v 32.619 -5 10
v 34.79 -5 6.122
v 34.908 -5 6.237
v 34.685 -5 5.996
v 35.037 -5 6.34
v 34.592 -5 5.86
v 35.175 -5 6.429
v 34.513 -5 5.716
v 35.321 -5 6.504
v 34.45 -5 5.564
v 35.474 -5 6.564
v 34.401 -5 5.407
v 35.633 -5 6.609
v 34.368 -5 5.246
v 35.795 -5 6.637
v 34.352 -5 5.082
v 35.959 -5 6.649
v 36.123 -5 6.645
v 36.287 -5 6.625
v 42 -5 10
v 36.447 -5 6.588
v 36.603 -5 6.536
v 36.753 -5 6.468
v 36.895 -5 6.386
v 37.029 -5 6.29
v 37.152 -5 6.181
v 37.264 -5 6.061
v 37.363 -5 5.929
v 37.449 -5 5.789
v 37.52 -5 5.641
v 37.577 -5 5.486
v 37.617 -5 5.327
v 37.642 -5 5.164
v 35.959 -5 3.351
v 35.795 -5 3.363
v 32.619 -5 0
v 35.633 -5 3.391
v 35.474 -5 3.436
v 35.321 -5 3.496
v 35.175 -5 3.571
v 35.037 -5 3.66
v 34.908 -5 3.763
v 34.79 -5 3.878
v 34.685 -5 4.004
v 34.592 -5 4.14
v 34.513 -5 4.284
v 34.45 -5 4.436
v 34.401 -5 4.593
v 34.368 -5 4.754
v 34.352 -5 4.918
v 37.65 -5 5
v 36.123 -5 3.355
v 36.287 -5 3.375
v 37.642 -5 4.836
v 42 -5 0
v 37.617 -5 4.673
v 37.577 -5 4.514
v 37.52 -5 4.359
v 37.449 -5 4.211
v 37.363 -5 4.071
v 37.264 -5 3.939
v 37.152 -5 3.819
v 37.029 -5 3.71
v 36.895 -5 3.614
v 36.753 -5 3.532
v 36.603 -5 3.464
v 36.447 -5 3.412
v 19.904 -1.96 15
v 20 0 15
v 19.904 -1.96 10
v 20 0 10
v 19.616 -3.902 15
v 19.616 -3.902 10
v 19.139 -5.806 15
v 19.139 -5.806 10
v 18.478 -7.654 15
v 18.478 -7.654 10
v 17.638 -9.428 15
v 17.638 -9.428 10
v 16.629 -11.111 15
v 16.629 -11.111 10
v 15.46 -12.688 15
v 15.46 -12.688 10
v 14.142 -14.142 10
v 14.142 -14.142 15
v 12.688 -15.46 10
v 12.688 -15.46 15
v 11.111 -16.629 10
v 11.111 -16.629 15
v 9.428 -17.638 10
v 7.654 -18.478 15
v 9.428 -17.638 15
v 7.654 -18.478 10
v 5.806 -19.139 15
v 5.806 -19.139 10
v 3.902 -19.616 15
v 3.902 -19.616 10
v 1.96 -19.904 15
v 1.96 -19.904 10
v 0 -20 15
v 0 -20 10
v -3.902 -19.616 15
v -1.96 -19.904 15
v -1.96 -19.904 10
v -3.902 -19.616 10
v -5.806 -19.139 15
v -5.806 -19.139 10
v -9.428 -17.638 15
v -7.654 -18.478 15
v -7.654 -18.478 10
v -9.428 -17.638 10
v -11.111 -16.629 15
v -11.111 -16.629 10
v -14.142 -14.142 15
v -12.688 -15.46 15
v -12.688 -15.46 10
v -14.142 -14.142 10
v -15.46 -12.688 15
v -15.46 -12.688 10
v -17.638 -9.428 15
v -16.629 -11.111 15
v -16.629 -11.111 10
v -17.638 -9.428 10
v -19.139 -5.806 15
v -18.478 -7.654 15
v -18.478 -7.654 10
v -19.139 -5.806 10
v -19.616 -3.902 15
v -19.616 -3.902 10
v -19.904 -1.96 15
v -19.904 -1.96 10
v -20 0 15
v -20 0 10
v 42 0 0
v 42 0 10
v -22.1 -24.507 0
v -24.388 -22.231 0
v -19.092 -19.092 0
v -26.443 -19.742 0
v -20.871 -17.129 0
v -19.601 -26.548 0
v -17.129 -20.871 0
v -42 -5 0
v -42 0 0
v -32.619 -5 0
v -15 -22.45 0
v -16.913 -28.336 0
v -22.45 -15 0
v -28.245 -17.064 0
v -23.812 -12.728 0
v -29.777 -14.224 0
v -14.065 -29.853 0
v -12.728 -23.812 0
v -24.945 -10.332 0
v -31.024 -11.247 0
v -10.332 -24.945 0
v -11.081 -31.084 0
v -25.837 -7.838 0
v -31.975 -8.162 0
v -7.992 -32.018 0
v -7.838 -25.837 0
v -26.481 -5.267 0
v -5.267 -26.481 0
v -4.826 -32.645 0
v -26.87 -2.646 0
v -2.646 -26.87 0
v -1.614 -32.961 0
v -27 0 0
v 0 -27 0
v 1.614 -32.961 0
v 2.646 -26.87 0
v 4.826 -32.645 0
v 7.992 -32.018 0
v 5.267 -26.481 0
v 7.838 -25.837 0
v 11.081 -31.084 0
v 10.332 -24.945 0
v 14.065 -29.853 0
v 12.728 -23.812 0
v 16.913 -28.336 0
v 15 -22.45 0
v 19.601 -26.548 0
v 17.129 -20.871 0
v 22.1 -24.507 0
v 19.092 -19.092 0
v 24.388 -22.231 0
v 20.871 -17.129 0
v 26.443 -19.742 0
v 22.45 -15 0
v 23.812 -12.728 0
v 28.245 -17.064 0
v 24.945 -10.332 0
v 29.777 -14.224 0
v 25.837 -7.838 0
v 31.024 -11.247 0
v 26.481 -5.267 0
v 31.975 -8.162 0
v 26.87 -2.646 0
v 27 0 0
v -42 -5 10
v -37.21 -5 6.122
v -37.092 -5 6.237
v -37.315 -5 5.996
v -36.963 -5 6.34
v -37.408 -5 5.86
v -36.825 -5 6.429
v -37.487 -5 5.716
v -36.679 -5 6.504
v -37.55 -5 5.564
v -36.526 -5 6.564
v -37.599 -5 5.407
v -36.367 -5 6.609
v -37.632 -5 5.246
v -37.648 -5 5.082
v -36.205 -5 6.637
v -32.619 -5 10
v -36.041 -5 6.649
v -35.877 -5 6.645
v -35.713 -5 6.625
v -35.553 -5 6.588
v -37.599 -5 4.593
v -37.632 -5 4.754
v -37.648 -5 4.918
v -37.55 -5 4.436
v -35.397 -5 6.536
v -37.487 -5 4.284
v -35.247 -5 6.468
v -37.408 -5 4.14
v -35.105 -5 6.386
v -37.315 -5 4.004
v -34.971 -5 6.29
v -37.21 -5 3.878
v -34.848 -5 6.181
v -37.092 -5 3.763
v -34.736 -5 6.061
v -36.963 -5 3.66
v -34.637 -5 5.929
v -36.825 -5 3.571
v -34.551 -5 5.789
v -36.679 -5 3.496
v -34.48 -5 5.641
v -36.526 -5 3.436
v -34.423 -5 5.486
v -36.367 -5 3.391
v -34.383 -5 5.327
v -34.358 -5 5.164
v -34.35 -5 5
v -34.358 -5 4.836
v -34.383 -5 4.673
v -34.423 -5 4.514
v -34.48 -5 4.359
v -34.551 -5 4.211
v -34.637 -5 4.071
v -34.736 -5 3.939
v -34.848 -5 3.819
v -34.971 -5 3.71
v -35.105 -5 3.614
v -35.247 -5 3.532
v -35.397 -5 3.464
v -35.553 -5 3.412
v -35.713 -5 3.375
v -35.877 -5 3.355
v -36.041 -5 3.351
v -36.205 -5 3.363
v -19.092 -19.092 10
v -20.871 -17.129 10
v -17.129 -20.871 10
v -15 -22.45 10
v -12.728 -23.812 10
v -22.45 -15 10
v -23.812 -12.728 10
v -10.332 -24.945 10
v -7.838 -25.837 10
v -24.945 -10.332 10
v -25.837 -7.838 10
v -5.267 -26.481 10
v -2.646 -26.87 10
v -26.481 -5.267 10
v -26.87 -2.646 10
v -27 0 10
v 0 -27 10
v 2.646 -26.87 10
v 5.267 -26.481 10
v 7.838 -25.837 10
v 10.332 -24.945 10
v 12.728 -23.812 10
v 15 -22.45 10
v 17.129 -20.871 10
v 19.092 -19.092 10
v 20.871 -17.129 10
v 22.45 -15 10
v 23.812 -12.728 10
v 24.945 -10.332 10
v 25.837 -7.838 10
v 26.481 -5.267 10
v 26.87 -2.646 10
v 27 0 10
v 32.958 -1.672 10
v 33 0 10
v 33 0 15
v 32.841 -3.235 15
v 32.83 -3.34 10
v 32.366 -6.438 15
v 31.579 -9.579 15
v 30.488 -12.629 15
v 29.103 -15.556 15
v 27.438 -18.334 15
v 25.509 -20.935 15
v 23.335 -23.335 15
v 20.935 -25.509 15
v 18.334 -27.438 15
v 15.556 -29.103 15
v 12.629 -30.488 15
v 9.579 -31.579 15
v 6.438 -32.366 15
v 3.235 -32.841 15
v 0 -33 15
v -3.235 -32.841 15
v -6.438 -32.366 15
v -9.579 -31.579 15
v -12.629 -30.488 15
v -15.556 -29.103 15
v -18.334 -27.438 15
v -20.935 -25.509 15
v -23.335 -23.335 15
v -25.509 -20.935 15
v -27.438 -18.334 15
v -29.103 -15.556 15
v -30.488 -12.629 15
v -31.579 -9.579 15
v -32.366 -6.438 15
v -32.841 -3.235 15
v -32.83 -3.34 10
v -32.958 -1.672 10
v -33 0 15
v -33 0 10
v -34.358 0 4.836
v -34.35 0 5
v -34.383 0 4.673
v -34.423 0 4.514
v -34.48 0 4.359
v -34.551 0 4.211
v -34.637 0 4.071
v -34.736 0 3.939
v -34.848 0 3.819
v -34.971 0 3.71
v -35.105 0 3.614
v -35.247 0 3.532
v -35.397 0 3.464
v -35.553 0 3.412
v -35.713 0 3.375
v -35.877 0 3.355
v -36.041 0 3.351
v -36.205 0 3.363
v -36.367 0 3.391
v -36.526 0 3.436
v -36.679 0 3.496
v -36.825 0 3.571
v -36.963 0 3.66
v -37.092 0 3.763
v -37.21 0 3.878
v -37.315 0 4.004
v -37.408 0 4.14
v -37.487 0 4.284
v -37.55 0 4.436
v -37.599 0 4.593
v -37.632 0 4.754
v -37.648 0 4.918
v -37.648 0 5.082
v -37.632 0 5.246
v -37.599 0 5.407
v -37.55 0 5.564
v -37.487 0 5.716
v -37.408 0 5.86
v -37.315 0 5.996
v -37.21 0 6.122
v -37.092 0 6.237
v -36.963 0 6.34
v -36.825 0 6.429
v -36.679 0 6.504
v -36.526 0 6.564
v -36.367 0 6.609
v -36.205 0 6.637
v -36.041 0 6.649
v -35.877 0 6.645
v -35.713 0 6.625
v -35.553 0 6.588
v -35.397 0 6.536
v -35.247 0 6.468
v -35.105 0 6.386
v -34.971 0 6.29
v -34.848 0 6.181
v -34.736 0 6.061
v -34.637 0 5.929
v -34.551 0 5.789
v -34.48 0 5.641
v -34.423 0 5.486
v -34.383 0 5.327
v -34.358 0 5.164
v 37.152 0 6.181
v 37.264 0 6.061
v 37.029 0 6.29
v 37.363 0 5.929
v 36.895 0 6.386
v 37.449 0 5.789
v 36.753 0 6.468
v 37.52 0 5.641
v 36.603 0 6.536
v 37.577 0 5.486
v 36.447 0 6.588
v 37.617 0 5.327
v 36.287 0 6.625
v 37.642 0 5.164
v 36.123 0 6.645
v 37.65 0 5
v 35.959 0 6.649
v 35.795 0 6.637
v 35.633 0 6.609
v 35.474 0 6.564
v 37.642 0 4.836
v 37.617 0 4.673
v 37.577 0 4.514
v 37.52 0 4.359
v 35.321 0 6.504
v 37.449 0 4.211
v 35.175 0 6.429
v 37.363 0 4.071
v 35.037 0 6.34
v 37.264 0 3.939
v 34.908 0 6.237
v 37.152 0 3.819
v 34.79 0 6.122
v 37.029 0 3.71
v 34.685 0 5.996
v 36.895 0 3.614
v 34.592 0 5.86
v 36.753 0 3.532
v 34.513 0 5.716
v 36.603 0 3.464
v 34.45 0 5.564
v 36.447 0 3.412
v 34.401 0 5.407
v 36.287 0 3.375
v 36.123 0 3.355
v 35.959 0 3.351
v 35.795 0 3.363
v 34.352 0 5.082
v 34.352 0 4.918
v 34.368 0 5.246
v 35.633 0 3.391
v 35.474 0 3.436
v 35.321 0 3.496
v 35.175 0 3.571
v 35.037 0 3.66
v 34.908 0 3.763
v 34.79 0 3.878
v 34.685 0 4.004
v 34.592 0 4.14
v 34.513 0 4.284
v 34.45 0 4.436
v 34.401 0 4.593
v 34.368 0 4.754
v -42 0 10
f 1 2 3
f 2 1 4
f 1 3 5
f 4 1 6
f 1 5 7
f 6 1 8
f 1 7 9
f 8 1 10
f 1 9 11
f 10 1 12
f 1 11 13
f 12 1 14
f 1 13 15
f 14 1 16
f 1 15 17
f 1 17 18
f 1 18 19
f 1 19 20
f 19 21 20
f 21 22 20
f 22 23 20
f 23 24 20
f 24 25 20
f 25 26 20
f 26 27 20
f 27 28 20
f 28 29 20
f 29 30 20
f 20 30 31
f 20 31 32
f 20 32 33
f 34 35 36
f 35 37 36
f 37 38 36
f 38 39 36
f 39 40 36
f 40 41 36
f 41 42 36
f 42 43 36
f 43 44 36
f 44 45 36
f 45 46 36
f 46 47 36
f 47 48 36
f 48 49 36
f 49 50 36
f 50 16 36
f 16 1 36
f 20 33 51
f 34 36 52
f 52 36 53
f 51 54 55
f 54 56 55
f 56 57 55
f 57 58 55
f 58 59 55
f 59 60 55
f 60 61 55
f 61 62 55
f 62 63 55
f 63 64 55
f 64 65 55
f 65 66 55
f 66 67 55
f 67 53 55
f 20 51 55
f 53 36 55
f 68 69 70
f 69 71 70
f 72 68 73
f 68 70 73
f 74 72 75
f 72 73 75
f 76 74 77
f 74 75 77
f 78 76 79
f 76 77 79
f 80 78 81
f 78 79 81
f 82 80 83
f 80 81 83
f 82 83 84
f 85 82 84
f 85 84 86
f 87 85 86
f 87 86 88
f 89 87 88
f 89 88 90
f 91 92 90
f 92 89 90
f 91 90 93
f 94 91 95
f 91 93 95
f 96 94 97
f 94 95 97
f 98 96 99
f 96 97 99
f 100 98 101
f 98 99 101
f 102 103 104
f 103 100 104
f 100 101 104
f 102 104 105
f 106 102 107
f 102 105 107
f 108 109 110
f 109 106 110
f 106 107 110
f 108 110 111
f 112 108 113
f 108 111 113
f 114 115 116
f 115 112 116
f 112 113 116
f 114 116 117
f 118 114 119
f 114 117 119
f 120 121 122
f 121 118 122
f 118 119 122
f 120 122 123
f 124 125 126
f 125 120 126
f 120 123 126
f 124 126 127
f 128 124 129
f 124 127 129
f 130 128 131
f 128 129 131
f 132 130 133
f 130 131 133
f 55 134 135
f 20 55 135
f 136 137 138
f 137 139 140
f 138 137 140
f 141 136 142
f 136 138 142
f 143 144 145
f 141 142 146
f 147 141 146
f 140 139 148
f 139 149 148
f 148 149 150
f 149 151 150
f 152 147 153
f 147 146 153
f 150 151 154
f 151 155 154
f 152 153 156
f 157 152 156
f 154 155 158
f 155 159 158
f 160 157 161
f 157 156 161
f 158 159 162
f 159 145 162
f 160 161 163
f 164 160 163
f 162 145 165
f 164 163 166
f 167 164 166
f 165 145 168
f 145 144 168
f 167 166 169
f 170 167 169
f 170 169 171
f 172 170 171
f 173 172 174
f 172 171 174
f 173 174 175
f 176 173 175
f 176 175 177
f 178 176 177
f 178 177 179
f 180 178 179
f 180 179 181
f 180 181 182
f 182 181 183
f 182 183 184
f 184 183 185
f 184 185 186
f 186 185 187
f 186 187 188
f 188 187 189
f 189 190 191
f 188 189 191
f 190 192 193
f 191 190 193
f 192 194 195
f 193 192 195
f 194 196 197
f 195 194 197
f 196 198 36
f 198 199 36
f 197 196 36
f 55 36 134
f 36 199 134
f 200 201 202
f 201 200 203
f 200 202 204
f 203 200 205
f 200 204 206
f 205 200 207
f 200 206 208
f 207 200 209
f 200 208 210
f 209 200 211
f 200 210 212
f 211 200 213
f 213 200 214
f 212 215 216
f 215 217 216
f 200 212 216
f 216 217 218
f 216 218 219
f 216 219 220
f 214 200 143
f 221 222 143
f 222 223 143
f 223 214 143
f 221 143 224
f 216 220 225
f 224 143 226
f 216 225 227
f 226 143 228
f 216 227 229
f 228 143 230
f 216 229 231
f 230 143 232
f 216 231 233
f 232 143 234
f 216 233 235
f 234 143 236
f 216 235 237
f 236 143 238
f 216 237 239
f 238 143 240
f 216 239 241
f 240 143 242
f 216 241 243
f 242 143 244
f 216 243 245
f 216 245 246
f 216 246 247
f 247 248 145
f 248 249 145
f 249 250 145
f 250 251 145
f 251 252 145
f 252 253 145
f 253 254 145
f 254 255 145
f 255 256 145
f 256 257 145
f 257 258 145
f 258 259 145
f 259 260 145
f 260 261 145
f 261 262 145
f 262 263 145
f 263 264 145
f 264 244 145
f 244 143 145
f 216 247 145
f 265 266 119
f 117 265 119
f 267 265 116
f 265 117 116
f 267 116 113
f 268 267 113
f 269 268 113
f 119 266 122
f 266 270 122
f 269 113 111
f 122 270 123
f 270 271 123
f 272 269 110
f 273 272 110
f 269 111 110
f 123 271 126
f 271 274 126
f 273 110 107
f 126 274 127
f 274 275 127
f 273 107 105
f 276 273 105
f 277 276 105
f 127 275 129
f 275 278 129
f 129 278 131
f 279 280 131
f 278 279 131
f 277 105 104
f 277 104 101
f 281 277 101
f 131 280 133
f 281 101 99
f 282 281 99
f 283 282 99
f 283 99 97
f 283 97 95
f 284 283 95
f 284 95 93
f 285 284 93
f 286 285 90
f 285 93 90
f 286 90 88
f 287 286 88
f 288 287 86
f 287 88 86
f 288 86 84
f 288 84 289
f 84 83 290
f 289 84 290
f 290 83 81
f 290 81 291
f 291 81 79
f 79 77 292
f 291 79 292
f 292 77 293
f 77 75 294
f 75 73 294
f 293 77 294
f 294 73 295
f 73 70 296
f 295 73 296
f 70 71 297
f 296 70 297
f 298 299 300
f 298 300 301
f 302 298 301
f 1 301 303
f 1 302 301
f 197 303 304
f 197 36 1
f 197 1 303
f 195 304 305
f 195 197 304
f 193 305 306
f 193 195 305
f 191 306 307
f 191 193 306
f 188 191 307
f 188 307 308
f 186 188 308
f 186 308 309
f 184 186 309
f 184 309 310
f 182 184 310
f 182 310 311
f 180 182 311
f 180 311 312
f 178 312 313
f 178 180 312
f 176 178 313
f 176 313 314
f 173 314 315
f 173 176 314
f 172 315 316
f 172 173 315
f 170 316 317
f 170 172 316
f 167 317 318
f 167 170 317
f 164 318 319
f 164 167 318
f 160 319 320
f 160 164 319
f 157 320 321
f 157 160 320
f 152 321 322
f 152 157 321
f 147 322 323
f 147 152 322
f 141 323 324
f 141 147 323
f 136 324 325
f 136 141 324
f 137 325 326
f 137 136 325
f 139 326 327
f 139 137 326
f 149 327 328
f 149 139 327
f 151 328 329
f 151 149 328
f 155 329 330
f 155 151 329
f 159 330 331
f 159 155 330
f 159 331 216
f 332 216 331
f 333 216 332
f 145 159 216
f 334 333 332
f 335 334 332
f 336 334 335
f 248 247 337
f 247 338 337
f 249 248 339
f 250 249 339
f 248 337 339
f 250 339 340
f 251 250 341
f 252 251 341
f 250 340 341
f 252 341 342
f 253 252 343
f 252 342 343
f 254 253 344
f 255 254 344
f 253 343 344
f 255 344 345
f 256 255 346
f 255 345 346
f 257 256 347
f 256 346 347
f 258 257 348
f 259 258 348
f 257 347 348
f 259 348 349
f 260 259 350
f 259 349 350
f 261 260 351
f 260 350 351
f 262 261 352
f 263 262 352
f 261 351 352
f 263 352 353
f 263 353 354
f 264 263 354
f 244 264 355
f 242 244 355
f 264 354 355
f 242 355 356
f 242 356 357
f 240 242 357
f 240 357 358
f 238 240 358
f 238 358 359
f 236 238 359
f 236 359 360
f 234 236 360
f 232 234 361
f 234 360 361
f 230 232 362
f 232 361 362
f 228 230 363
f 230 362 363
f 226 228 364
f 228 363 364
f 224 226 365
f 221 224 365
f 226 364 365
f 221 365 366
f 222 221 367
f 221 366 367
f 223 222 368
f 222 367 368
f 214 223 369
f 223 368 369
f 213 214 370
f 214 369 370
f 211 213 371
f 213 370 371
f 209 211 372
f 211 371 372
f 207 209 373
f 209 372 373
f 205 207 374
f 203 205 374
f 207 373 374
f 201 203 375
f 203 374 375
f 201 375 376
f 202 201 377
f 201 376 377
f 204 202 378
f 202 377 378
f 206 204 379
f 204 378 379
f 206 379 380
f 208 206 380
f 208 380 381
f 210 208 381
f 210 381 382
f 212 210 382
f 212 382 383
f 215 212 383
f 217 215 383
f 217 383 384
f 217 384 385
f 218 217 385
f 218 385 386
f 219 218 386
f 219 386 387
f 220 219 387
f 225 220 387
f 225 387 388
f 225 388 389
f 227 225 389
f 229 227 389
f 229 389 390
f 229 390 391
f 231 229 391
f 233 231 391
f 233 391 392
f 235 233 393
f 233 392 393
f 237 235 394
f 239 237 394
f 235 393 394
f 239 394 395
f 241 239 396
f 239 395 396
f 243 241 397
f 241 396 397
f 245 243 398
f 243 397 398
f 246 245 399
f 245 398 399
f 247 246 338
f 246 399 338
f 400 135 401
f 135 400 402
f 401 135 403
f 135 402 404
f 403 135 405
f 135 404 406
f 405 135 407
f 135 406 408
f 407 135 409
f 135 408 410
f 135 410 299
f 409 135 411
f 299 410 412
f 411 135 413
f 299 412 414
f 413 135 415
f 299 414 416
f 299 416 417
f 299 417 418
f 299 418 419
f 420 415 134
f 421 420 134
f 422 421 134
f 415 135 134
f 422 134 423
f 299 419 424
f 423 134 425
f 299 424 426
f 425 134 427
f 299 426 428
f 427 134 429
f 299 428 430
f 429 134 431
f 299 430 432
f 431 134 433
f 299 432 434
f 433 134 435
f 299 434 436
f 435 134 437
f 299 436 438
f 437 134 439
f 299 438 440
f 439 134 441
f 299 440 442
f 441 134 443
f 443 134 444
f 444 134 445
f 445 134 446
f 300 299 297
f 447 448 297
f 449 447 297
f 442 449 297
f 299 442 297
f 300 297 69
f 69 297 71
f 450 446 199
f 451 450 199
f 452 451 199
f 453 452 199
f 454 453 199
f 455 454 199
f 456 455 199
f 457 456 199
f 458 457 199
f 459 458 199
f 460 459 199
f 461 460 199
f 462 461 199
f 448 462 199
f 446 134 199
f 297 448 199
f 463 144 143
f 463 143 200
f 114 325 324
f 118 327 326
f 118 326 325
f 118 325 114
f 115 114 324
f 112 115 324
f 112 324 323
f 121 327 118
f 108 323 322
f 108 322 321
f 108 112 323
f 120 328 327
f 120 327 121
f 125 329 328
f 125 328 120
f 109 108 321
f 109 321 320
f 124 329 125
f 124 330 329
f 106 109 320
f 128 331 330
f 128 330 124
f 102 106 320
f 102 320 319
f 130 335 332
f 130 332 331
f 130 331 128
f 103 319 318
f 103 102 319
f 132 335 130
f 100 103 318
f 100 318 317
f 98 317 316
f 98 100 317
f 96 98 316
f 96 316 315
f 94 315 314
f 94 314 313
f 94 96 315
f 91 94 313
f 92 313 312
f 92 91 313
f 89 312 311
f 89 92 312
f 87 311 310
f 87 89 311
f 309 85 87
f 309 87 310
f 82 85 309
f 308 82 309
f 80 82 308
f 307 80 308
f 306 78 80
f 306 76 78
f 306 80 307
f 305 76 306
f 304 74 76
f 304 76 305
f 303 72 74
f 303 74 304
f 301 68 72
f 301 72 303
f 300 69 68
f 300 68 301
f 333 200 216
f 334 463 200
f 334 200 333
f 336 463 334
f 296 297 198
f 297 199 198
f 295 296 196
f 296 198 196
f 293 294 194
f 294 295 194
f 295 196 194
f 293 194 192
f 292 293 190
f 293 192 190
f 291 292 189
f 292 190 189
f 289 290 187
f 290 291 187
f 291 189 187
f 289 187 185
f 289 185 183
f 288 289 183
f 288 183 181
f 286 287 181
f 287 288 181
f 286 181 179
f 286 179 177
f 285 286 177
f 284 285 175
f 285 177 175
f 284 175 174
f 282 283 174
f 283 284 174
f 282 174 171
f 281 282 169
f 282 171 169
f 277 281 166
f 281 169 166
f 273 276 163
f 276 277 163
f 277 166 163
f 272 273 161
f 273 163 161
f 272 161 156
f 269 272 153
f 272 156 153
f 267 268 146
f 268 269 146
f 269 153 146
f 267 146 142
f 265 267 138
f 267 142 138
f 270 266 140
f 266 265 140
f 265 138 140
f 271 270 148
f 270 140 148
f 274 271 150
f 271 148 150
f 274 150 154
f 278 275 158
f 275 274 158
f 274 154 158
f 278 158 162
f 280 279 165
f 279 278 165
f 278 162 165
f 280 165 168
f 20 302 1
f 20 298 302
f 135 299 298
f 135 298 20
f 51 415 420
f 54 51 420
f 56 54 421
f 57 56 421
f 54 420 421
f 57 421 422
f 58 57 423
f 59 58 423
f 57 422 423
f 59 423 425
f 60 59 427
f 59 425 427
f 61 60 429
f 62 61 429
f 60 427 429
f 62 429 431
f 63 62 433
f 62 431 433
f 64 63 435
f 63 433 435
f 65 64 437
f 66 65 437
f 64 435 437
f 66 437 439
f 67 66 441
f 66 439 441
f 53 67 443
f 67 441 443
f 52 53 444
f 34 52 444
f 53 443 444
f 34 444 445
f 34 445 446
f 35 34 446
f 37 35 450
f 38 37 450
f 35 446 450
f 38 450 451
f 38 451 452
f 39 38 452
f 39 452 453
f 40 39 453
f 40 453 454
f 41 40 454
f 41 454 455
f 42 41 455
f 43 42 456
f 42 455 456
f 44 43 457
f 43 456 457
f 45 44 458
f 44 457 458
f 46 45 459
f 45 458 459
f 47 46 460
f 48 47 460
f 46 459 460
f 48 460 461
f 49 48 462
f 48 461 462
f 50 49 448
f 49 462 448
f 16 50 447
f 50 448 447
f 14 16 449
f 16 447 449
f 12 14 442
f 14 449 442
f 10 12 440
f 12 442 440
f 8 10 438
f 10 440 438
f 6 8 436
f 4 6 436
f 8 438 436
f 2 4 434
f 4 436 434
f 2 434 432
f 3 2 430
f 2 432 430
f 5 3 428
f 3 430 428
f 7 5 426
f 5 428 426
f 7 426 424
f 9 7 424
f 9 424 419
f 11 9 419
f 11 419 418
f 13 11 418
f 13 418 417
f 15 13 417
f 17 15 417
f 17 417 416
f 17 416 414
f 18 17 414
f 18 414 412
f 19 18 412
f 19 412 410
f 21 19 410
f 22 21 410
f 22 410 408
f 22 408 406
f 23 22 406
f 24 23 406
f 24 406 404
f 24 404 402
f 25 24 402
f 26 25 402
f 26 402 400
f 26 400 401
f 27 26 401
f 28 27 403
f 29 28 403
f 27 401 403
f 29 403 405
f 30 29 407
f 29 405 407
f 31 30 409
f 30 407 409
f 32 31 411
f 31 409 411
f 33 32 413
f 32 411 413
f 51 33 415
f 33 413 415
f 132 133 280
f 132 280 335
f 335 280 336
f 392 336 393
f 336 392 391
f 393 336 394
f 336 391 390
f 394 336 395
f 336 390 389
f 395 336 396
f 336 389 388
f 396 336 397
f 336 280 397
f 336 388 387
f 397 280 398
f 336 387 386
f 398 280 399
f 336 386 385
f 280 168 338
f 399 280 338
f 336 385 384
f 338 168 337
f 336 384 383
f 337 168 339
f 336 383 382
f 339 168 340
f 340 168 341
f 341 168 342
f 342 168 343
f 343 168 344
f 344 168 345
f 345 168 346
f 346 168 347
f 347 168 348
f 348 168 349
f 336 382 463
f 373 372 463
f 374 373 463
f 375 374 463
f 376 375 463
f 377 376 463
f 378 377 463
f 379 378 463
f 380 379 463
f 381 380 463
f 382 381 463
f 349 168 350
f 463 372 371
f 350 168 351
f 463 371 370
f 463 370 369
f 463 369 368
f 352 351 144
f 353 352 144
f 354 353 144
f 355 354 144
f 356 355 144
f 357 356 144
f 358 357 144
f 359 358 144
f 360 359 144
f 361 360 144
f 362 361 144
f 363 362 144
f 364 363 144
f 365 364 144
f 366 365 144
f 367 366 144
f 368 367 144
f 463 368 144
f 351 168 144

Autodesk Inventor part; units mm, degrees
ref_plane "YZ Plane" through (0, 0, 0) normal (1, 0, 0) x (0, 1, 0)
ref_plane "XZ Plane" through (0, 0, 0) normal (0, 1, 0) x (-1, 0, 0)
ref_plane "XY Plane" through (0, 0, 0) normal (0, 0, 1) x (1, 0, 0)
sketch "Sketch1" plane through (0, 0, 0) normal (0, 0, 1) x (1, 0, 0)
  arc A0 (-33, 0) -> (33, 0) centre (0, 0) ccw
  arc A1 (-27, 0) -> (27, 0) centre (0, 0) ccw
  line L0 (-33, 0) -> (-27, 0)
  line L1 (27, 0) -> (33, 0)
  dimension "d0" = 66
  dimension "d1" = 54
extrude "Extrusion1" add sketch "Sketch1" along normal blind 10
sketch "Sketch2" plane through (-33, 0, 0) normal (0, 1, 0) x (1, 0, 0)
  line L0 (6, 0) -> (6, -10) projected
  line L1 (6, 0) -> (-9, 0)
  line L2 (-9, 0) -> (-9, -10)
  line L3 (-9, -10) -> (6, -10)
  line L4 (6, -10) -> (6, 0)
  line L5 (66, 0) -> (60, 0) projected
  line L6 (60, 0) -> (75, 0)
  line L7 (75, 0) -> (75, -10)
  line L8 (75, -10) -> (60, -10)
  line L9 (60, -10) -> (60, 0)
  point P0 (33, 0)
  dimension "d4" = 15
extrude "Extrusion2" add sketch "Sketch2" against normal blind 5
sketch "Sketch3" plane through (-27, 0, 10) normal (0, 1, 0) x (1, 0, 0)
  circle A0 centre (-9, 5) radius 1.65
  circle A1 centre (63, 5) radius 1.65
  line L0 (0, 10) -> (-15, 10) projected
  line L1 (-15, 10) -> (-15, 0) projected
  line L2 (69, 10) -> (54, 10) projected
  line L3 (69, 0) -> (69, 10) projected
  point P0 (27, 10)
  dimension "d7" = 5
  dimension "d8" = 6
  dimension "d9" = 5
  dimension "d10" = 6
  dimension "d11" = 3.3
extrude "Extrusion3" cut sketch "Sketch3" against normal blind 5
sketch "Sketch4" plane through (0, 0, 10) normal (0, 0, 1) x (1, 0, 0)
  arc A0 (-33, 0) -> (33, 0) centre (0, 0) ccw
  arc A1 (-20, 0) -> (20, 0) centre (0, 0) ccw
  line L0 (-27, 0) -> (-42, 0) projected
  line L1 (33, 0) -> (20, 0)
  line L2 (-20, 0) -> (-33, 0)
  dimension "d14" = 40
  dimension "d15" = 66
extrude "Extrusion4" add sketch "Sketch4" along normal blind 5
properties part number "22010B_Tube End Support_V1" material "ABS Plastic"
